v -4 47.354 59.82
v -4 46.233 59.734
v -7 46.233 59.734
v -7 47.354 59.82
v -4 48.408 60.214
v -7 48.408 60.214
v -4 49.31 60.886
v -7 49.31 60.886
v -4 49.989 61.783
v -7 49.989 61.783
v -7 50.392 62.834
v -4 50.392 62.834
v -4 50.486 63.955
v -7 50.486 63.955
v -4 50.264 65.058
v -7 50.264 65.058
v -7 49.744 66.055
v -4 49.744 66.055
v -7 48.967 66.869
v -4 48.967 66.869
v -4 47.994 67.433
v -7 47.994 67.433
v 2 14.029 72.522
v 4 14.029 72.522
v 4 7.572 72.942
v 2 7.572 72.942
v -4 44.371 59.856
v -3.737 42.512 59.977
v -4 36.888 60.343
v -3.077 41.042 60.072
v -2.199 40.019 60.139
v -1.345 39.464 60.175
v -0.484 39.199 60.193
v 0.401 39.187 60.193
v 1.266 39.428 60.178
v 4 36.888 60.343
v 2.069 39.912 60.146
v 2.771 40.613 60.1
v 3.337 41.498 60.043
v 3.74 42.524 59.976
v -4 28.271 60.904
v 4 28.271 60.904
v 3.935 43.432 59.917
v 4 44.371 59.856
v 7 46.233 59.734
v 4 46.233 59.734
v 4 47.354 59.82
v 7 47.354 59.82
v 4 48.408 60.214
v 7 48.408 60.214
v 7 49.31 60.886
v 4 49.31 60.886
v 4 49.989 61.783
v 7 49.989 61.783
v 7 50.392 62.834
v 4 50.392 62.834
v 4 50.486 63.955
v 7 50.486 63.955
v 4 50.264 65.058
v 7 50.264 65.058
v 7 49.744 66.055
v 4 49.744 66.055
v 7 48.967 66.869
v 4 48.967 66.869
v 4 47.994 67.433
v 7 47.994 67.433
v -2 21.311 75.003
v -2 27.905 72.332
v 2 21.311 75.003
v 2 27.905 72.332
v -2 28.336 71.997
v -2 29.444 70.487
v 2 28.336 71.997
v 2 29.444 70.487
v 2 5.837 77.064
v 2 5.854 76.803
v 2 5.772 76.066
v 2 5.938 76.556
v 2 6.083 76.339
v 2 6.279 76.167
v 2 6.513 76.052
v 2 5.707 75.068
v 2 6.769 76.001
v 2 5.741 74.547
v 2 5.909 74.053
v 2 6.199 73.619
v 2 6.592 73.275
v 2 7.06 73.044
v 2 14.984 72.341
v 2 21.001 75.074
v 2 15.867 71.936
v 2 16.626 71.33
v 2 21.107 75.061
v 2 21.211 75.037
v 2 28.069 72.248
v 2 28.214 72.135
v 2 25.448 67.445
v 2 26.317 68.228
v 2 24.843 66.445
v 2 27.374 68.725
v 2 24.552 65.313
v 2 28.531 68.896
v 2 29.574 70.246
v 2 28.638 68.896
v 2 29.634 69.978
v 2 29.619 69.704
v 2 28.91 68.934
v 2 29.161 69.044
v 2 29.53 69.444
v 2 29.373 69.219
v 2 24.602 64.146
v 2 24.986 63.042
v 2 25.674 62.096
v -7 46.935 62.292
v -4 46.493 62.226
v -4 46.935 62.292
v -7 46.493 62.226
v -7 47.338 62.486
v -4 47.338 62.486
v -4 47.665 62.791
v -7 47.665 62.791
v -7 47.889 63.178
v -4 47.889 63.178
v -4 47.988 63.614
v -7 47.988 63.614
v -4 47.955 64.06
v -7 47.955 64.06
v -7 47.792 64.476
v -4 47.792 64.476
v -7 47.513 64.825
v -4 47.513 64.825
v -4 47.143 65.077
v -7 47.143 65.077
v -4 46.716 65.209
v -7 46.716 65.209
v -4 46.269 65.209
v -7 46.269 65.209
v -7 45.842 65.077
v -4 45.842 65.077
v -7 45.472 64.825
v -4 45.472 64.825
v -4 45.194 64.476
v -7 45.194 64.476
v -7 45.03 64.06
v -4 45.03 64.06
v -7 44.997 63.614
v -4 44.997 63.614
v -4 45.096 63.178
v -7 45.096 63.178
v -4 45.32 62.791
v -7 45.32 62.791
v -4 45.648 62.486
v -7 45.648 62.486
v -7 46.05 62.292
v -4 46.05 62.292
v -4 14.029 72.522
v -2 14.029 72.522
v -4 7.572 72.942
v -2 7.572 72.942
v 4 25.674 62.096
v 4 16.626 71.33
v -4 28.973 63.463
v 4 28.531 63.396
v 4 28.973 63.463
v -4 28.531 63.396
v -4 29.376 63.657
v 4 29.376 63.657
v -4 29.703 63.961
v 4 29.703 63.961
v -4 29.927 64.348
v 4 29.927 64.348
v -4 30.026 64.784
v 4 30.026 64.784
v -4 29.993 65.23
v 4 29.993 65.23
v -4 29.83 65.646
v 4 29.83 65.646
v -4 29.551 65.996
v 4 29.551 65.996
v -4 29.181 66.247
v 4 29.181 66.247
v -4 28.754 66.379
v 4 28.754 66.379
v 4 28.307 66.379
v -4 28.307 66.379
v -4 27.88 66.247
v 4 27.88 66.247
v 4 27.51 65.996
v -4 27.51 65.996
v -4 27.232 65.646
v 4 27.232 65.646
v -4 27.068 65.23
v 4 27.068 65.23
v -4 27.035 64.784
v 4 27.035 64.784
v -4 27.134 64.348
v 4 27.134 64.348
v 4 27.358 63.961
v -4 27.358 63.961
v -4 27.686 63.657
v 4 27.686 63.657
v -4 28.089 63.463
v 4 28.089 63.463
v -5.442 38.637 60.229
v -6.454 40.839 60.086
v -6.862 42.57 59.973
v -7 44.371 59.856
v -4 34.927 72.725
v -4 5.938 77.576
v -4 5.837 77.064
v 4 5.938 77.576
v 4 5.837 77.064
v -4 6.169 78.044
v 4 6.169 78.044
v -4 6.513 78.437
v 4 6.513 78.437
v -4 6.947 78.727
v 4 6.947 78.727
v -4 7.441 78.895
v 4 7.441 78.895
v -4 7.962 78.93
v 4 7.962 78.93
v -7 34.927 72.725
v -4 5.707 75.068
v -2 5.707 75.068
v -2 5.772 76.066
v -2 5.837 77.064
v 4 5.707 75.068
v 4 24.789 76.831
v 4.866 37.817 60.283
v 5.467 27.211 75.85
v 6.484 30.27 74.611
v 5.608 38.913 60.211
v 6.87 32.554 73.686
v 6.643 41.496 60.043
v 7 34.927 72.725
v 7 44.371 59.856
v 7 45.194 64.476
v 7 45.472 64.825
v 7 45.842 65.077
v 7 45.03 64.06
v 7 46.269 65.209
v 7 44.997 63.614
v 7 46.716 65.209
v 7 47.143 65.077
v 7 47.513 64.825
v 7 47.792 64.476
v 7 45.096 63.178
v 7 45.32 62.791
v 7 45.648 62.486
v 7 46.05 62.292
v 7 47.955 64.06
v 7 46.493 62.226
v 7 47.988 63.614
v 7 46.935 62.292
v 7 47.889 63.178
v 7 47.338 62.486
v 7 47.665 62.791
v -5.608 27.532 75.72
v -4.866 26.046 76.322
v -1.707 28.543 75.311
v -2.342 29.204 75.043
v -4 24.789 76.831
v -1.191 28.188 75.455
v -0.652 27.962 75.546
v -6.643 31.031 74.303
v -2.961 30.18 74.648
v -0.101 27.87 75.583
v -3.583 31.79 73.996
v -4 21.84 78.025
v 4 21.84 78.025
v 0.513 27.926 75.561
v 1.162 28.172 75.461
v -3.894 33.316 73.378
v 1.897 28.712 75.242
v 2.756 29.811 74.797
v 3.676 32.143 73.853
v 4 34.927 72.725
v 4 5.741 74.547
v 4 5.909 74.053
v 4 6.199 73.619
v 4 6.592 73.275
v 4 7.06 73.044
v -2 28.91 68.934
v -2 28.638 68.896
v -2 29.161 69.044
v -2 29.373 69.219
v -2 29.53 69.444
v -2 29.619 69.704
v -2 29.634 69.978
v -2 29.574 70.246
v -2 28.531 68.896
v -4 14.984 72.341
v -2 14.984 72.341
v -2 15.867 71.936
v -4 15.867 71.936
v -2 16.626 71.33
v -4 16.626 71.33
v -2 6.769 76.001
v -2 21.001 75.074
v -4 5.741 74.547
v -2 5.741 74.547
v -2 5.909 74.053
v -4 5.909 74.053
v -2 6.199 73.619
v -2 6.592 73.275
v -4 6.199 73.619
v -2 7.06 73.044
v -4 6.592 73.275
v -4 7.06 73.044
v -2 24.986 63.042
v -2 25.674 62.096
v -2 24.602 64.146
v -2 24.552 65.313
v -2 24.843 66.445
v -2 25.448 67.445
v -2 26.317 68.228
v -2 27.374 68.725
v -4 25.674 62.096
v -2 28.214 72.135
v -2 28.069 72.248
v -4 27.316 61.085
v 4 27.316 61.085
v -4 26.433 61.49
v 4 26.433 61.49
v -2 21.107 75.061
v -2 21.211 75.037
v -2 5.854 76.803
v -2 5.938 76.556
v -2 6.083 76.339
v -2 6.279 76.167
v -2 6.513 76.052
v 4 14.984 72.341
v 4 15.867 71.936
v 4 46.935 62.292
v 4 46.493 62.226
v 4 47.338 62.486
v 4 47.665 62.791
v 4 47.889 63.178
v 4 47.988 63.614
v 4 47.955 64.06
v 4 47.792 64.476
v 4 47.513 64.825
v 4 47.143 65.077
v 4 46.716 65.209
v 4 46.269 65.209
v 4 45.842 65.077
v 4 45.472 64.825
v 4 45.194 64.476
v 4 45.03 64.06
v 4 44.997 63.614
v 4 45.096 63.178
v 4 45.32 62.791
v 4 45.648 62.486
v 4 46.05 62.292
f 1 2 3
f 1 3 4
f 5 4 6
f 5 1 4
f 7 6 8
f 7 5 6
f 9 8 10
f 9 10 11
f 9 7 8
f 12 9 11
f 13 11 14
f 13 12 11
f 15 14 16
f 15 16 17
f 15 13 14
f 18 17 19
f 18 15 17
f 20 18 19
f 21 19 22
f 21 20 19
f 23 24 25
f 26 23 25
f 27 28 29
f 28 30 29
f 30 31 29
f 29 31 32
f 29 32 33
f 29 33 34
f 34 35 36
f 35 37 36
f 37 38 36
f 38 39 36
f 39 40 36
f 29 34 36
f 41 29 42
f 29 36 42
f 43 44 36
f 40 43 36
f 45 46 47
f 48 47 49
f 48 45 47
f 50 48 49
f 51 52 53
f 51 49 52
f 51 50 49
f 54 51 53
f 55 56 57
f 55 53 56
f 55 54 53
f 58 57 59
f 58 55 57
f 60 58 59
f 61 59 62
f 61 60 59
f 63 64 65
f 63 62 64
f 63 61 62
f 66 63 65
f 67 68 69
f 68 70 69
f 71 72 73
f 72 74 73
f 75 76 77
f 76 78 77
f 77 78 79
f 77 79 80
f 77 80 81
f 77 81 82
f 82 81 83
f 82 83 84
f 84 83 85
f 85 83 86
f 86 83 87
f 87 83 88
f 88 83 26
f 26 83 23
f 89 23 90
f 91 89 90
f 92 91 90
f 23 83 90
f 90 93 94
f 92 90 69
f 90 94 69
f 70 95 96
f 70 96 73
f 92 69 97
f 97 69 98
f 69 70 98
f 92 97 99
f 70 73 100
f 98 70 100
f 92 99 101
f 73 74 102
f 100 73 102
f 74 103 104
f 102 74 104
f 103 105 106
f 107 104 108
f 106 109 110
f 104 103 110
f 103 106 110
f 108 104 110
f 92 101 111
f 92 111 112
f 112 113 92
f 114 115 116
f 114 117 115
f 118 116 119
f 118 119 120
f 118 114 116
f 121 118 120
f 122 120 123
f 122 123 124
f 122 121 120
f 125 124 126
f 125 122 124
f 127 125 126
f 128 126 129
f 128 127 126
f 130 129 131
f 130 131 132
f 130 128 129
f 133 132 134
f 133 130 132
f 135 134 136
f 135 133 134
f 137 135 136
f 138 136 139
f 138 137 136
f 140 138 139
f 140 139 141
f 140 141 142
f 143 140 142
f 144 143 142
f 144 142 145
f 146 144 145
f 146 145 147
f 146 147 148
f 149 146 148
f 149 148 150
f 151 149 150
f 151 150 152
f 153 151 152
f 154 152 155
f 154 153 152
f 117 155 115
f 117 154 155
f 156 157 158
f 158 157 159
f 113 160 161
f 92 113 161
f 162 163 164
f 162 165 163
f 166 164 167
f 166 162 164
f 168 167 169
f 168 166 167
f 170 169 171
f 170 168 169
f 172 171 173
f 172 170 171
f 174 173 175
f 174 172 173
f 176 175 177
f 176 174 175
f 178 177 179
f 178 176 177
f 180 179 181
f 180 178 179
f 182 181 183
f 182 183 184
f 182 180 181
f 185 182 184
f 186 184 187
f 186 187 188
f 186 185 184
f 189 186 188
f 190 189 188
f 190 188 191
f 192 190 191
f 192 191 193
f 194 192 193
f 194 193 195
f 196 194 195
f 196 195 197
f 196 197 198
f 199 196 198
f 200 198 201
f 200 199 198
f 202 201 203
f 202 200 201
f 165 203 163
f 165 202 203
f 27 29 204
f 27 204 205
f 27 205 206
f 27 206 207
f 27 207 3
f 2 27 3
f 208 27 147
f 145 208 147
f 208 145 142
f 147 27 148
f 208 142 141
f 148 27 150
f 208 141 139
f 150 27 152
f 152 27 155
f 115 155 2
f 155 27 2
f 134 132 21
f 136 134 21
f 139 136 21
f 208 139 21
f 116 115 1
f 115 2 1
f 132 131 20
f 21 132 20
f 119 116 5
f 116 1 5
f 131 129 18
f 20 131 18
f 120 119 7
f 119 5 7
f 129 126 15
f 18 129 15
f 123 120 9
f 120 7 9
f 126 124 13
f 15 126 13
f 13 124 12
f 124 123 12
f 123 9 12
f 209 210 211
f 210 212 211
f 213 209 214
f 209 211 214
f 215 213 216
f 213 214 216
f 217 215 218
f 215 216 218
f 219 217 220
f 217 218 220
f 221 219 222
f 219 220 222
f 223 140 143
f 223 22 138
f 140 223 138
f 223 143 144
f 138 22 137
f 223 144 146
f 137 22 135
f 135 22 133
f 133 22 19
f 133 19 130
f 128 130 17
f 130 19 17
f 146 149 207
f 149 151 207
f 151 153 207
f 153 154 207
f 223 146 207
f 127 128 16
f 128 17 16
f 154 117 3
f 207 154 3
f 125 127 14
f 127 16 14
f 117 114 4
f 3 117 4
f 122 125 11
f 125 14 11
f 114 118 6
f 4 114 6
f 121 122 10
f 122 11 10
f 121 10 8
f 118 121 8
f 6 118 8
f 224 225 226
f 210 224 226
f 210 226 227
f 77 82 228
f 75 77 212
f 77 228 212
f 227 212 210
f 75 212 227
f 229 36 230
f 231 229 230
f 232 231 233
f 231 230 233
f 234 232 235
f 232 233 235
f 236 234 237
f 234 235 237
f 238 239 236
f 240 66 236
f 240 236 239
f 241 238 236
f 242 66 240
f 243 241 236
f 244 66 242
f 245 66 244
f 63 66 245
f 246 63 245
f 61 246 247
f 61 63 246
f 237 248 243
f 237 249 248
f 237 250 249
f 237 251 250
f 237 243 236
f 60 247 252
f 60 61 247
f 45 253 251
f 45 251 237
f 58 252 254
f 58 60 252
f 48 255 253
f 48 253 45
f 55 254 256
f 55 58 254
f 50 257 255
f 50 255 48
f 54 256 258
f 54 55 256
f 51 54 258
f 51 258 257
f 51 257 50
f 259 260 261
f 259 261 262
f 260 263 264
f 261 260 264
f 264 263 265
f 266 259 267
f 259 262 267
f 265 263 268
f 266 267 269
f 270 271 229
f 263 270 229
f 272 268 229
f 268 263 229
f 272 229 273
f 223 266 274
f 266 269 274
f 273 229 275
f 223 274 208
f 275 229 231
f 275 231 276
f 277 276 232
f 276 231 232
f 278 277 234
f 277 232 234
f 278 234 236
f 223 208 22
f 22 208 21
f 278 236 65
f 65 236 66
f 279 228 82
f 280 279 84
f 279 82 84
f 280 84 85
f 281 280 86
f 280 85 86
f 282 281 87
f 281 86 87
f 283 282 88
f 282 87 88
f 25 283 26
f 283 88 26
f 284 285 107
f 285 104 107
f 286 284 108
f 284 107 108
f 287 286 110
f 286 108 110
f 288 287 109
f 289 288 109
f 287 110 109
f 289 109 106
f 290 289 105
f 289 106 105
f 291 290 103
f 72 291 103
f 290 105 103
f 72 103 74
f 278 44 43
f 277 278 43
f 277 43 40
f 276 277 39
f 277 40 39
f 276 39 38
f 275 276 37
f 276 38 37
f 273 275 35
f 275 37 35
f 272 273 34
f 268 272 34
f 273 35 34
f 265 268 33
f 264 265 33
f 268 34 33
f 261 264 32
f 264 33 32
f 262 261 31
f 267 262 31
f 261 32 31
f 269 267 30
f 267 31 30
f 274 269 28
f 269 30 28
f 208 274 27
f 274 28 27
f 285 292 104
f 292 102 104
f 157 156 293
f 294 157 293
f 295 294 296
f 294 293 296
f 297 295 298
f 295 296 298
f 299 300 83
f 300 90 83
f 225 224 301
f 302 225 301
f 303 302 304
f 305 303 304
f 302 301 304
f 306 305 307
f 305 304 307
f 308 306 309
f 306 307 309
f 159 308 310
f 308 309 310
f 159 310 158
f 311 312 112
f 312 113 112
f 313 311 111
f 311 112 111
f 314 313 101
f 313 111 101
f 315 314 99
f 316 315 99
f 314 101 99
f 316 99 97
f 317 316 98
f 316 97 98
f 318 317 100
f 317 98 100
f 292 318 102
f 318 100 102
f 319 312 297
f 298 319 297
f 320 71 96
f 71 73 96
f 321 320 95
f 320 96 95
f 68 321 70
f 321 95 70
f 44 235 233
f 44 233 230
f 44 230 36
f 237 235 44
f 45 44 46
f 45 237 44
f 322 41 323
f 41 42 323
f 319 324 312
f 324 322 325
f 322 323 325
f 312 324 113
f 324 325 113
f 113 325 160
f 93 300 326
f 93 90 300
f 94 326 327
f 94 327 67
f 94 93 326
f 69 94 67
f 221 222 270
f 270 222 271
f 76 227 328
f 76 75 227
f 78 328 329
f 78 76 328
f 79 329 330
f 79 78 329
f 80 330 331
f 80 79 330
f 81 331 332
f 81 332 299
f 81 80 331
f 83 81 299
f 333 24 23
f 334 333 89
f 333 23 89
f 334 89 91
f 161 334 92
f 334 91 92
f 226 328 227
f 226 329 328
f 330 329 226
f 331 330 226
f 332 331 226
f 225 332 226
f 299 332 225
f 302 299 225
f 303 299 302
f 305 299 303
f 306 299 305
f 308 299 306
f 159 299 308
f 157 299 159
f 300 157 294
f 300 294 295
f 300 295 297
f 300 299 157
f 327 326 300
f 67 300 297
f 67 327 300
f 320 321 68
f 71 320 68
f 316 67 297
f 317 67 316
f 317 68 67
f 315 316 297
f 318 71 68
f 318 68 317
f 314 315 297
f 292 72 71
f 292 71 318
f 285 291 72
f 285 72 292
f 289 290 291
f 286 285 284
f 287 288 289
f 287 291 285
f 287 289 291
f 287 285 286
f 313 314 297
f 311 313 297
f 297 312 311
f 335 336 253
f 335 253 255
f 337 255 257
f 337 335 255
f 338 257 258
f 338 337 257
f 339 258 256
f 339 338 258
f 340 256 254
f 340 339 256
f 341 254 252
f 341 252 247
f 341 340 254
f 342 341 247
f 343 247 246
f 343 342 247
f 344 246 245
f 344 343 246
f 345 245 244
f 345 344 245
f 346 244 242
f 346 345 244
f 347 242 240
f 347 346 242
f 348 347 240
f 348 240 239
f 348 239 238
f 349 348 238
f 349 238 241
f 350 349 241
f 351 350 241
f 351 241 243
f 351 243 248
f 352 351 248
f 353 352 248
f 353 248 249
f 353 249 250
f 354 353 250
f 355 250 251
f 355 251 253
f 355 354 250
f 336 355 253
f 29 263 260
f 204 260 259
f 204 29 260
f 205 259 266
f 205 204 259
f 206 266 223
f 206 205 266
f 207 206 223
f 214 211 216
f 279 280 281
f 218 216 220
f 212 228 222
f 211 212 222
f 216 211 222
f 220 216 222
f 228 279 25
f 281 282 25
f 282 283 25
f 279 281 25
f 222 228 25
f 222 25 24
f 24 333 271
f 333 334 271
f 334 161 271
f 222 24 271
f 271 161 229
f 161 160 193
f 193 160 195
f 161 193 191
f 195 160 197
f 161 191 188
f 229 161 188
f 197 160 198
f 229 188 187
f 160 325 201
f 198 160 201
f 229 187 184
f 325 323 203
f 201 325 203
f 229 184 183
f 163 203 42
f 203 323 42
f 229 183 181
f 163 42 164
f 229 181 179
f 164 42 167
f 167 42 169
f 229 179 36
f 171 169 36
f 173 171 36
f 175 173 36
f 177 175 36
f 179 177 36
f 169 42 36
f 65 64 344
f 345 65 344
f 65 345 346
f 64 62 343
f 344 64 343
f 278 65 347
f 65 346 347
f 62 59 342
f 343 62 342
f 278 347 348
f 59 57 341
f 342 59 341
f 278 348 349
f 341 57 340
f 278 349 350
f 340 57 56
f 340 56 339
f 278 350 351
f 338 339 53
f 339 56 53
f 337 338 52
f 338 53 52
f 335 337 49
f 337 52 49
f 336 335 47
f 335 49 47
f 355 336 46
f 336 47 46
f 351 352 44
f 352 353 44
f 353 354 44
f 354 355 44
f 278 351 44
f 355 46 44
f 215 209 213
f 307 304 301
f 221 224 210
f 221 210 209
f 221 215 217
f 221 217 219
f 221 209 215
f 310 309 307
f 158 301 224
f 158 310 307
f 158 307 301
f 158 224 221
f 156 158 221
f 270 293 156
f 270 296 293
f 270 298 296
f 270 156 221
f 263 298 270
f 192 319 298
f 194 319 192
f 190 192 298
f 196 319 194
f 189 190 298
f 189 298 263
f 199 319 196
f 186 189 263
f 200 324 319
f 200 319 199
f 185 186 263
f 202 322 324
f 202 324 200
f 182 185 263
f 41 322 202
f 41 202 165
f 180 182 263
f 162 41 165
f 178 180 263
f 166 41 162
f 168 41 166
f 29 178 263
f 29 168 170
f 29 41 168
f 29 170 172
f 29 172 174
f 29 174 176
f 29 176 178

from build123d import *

# Parameters (mm, degrees)
SKETCH_1_R               = 1.5
EXTRUDE_1_DEPTH          = 4
FILLET_1_R               = 2
FILLET_2_R               = 4
SKETCH_2_R               = 1.5
EXTRUDE_2_DEPTH          = 7
CUT_EXTRUDE_1_DEPTH      = 75.524894896
CUT_EXTRUDE_1_DEPTH_BACK = 75.524894896
CUT_EXTRUDE_2_DEPTH      = 2
FILLET_3_R               = 1


with BuildPart() as part:
    # 草图1 → 凸台-拉伸1 (new, symmetric)
    with BuildSketch(Plane(origin=(0, 0, 0), x_dir=(0, 0, -1), z_dir=(1, 0, 0))):
        with BuildLine():
            Line((-59.734284448, 46.23253896), (-60.904491974, 28.270617728))
            ThreePointArc((-60.904491974, 28.270617728), (-61.260668779, 26.862087023), (-62.096445312, 25.67368547))
            Line((-62.096445312, 25.67368547), (-72.42215962, 15.555403796))
            Line((-72.42215962, 15.555403796), (-73.072274912, 5.576558667))
            Line((-73.072274912, 5.576558667), (-79.059581989, 5.966627842))
            Line((-79.059581989, 5.966627842), (-78.025468729, 21.839590984))
            Line((-78.025468729, 21.839590984), (-67.433323191, 47.994063888))
            ThreePointArc((-67.433323191, 47.994063888), (-62.833683596, 50.391827077), (-59.734284448, 46.23253896))
        make_face()
        with Locations((-64.896030026, 28.530663844)):
            Circle(SKETCH_1_R, mode=Mode.SUBTRACT)
        with Locations((-63.7258225, 46.492585076)):
            Circle(SKETCH_1_R, mode=Mode.SUBTRACT)
    extrude(amount=EXTRUDE_1_DEPTH, both=True)

    # 圆角1
    fillet_1_edges = [part.edges().sort_by_distance(p)[0] for p in [
        (0, 5.576558667, 73.072274912),
        (0, 5.966627842, 79.059581989),
    ]]
    fillet(fillet_1_edges, radius=FILLET_1_R)

    # 圆角2
    fillet_2_edges = [part.edges().sort_by_distance(p)[0] for p in [
        (0, 15.555403796, 72.42215962),
    ]]
    fillet(fillet_2_edges, radius=FILLET_2_R)

    # 草图2 → 凸台-拉伸2 (add, symmetric)
    with BuildSketch(Plane(origin=(0, 0, 0), x_dir=(0, 0, -1), z_dir=(1, 0, 0))):
        with BuildLine():
            Line((-60.534478137, 33.950088462), (-59.734284448, 46.23253896))
            ThreePointArc((-59.734284448, 46.23253896), (-62.833683596, 50.391827077), (-67.433323191, 47.994063888))
            Line((-67.433323191, 47.994063888), (-78.025468729, 21.839590984))
            Line((-78.025468729, 21.839590984), (-78.075072521, 21.07820517))
            Line((-78.075072521, 21.07820517), (-60.534478137, 33.950088462))
        make_face()
        with Locations((-63.7258225, 46.492585076)):
            Circle(SKETCH_2_R, mode=Mode.SUBTRACT)
    extrude(amount=EXTRUDE_2_DEPTH, both=True)

    # 草图3 → 切除-拉伸1 (cut, two sides: drawn at the far end of the back side and taken through both)
    with BuildSketch(Plane(origin=(0, 76.493888819, 81.941089709), x_dir=(-1, 0, 0), z_dir=(0, -0.5916260801069638, 0.8062124914296904)).offset(-CUT_EXTRUDE_1_DEPTH_BACK)):
        with BuildLine():
            Line((4, 38.964052974), (4, 30.964052974))
            Line((4, 30.964052974), (-4, 30.964052974))
            Line((-4, 30.964052974), (-4, 38.964052974))
            ThreePointArc((-4, 38.964052974), (0, 42.964052974), (4, 38.964052974))
        make_face()
        with BuildLine():
            Line((7, 38.964052974), (7, 53.964052974))
            Line((7, 53.964052974), (4, 53.964052974))
            Line((4, 53.964052974), (4, 44.70861562))
            ThreePointArc((4, 44.70861562), (6.204836823, 42.204423323), (7, 38.964052974))
        make_face()
        with BuildLine():
            Line((-4, 53.964052974), (-4, 44.70861562))
            ThreePointArc((-4, 44.70861562), (-6.204836823, 42.204423323), (-7, 38.964052974))
            Line((-7, 38.964052974), (-7, 53.964052974))
            Line((-7, 53.964052974), (-4, 53.964052974))
        make_face()
    extrude(amount=CUT_EXTRUDE_1_DEPTH + CUT_EXTRUDE_1_DEPTH_BACK, mode=Mode.SUBTRACT)

    # 草图4 → 切除-拉伸2 (cut, symmetric)
    with BuildSketch(Plane(origin=(0, 0, 0), x_dir=(0, 0, -1), z_dir=(1, 0, 0))):
        with BuildLine():
            Line((-68.896030026, 28.530663844), (-68.896030026, 30.611669816))
            Line((-68.896030026, 30.611669816), (-72.22581768, 28.168158659))
            Line((-72.22581768, 28.168158659), (-75.063263573, 21.161844268))
            Line((-75.063263573, 21.161844268), (-76.06592845, 5.771593254))
            Line((-76.06592845, 5.771593254), (-75.068043938, 5.706581725))
            ThreePointArc((-75.068043938, 5.706581725), (-73.618739254, 6.199188753), (-72.942251853, 7.572327692))
            Line((-72.942251853, 7.572327692), (-72.52160152, 14.029035582))
            ThreePointArc((-72.52160152, 14.029035582), (-72.165424714, 15.437566287), (-71.329648181, 16.62596784))
            Line((-71.329648181, 16.62596784), (-62.096445312, 25.67368547))
            ThreePointArc((-62.096445312, 25.67368547), (-66.445491407, 24.842958673), (-68.896030026, 28.530663844))
        make_face()
    extrude(amount=CUT_EXTRUDE_2_DEPTH, both=True, mode=Mode.SUBTRACT)

    # 圆角3
    fillet_3_edges = [part.edges().sort_by_distance(p)[0] for p in [
        (0, 28.168158659, 72.22581768),
        (0, 30.611669816, 68.896030026),
        (0, 5.771593254, 76.06592845),
        (0, 21.161844268, 75.063263573),
    ]]
    fillet(fillet_3_edges, radius=FILLET_3_R - 0.0001)  # a hair under: the kernel refuses the full size


solid = part.part
